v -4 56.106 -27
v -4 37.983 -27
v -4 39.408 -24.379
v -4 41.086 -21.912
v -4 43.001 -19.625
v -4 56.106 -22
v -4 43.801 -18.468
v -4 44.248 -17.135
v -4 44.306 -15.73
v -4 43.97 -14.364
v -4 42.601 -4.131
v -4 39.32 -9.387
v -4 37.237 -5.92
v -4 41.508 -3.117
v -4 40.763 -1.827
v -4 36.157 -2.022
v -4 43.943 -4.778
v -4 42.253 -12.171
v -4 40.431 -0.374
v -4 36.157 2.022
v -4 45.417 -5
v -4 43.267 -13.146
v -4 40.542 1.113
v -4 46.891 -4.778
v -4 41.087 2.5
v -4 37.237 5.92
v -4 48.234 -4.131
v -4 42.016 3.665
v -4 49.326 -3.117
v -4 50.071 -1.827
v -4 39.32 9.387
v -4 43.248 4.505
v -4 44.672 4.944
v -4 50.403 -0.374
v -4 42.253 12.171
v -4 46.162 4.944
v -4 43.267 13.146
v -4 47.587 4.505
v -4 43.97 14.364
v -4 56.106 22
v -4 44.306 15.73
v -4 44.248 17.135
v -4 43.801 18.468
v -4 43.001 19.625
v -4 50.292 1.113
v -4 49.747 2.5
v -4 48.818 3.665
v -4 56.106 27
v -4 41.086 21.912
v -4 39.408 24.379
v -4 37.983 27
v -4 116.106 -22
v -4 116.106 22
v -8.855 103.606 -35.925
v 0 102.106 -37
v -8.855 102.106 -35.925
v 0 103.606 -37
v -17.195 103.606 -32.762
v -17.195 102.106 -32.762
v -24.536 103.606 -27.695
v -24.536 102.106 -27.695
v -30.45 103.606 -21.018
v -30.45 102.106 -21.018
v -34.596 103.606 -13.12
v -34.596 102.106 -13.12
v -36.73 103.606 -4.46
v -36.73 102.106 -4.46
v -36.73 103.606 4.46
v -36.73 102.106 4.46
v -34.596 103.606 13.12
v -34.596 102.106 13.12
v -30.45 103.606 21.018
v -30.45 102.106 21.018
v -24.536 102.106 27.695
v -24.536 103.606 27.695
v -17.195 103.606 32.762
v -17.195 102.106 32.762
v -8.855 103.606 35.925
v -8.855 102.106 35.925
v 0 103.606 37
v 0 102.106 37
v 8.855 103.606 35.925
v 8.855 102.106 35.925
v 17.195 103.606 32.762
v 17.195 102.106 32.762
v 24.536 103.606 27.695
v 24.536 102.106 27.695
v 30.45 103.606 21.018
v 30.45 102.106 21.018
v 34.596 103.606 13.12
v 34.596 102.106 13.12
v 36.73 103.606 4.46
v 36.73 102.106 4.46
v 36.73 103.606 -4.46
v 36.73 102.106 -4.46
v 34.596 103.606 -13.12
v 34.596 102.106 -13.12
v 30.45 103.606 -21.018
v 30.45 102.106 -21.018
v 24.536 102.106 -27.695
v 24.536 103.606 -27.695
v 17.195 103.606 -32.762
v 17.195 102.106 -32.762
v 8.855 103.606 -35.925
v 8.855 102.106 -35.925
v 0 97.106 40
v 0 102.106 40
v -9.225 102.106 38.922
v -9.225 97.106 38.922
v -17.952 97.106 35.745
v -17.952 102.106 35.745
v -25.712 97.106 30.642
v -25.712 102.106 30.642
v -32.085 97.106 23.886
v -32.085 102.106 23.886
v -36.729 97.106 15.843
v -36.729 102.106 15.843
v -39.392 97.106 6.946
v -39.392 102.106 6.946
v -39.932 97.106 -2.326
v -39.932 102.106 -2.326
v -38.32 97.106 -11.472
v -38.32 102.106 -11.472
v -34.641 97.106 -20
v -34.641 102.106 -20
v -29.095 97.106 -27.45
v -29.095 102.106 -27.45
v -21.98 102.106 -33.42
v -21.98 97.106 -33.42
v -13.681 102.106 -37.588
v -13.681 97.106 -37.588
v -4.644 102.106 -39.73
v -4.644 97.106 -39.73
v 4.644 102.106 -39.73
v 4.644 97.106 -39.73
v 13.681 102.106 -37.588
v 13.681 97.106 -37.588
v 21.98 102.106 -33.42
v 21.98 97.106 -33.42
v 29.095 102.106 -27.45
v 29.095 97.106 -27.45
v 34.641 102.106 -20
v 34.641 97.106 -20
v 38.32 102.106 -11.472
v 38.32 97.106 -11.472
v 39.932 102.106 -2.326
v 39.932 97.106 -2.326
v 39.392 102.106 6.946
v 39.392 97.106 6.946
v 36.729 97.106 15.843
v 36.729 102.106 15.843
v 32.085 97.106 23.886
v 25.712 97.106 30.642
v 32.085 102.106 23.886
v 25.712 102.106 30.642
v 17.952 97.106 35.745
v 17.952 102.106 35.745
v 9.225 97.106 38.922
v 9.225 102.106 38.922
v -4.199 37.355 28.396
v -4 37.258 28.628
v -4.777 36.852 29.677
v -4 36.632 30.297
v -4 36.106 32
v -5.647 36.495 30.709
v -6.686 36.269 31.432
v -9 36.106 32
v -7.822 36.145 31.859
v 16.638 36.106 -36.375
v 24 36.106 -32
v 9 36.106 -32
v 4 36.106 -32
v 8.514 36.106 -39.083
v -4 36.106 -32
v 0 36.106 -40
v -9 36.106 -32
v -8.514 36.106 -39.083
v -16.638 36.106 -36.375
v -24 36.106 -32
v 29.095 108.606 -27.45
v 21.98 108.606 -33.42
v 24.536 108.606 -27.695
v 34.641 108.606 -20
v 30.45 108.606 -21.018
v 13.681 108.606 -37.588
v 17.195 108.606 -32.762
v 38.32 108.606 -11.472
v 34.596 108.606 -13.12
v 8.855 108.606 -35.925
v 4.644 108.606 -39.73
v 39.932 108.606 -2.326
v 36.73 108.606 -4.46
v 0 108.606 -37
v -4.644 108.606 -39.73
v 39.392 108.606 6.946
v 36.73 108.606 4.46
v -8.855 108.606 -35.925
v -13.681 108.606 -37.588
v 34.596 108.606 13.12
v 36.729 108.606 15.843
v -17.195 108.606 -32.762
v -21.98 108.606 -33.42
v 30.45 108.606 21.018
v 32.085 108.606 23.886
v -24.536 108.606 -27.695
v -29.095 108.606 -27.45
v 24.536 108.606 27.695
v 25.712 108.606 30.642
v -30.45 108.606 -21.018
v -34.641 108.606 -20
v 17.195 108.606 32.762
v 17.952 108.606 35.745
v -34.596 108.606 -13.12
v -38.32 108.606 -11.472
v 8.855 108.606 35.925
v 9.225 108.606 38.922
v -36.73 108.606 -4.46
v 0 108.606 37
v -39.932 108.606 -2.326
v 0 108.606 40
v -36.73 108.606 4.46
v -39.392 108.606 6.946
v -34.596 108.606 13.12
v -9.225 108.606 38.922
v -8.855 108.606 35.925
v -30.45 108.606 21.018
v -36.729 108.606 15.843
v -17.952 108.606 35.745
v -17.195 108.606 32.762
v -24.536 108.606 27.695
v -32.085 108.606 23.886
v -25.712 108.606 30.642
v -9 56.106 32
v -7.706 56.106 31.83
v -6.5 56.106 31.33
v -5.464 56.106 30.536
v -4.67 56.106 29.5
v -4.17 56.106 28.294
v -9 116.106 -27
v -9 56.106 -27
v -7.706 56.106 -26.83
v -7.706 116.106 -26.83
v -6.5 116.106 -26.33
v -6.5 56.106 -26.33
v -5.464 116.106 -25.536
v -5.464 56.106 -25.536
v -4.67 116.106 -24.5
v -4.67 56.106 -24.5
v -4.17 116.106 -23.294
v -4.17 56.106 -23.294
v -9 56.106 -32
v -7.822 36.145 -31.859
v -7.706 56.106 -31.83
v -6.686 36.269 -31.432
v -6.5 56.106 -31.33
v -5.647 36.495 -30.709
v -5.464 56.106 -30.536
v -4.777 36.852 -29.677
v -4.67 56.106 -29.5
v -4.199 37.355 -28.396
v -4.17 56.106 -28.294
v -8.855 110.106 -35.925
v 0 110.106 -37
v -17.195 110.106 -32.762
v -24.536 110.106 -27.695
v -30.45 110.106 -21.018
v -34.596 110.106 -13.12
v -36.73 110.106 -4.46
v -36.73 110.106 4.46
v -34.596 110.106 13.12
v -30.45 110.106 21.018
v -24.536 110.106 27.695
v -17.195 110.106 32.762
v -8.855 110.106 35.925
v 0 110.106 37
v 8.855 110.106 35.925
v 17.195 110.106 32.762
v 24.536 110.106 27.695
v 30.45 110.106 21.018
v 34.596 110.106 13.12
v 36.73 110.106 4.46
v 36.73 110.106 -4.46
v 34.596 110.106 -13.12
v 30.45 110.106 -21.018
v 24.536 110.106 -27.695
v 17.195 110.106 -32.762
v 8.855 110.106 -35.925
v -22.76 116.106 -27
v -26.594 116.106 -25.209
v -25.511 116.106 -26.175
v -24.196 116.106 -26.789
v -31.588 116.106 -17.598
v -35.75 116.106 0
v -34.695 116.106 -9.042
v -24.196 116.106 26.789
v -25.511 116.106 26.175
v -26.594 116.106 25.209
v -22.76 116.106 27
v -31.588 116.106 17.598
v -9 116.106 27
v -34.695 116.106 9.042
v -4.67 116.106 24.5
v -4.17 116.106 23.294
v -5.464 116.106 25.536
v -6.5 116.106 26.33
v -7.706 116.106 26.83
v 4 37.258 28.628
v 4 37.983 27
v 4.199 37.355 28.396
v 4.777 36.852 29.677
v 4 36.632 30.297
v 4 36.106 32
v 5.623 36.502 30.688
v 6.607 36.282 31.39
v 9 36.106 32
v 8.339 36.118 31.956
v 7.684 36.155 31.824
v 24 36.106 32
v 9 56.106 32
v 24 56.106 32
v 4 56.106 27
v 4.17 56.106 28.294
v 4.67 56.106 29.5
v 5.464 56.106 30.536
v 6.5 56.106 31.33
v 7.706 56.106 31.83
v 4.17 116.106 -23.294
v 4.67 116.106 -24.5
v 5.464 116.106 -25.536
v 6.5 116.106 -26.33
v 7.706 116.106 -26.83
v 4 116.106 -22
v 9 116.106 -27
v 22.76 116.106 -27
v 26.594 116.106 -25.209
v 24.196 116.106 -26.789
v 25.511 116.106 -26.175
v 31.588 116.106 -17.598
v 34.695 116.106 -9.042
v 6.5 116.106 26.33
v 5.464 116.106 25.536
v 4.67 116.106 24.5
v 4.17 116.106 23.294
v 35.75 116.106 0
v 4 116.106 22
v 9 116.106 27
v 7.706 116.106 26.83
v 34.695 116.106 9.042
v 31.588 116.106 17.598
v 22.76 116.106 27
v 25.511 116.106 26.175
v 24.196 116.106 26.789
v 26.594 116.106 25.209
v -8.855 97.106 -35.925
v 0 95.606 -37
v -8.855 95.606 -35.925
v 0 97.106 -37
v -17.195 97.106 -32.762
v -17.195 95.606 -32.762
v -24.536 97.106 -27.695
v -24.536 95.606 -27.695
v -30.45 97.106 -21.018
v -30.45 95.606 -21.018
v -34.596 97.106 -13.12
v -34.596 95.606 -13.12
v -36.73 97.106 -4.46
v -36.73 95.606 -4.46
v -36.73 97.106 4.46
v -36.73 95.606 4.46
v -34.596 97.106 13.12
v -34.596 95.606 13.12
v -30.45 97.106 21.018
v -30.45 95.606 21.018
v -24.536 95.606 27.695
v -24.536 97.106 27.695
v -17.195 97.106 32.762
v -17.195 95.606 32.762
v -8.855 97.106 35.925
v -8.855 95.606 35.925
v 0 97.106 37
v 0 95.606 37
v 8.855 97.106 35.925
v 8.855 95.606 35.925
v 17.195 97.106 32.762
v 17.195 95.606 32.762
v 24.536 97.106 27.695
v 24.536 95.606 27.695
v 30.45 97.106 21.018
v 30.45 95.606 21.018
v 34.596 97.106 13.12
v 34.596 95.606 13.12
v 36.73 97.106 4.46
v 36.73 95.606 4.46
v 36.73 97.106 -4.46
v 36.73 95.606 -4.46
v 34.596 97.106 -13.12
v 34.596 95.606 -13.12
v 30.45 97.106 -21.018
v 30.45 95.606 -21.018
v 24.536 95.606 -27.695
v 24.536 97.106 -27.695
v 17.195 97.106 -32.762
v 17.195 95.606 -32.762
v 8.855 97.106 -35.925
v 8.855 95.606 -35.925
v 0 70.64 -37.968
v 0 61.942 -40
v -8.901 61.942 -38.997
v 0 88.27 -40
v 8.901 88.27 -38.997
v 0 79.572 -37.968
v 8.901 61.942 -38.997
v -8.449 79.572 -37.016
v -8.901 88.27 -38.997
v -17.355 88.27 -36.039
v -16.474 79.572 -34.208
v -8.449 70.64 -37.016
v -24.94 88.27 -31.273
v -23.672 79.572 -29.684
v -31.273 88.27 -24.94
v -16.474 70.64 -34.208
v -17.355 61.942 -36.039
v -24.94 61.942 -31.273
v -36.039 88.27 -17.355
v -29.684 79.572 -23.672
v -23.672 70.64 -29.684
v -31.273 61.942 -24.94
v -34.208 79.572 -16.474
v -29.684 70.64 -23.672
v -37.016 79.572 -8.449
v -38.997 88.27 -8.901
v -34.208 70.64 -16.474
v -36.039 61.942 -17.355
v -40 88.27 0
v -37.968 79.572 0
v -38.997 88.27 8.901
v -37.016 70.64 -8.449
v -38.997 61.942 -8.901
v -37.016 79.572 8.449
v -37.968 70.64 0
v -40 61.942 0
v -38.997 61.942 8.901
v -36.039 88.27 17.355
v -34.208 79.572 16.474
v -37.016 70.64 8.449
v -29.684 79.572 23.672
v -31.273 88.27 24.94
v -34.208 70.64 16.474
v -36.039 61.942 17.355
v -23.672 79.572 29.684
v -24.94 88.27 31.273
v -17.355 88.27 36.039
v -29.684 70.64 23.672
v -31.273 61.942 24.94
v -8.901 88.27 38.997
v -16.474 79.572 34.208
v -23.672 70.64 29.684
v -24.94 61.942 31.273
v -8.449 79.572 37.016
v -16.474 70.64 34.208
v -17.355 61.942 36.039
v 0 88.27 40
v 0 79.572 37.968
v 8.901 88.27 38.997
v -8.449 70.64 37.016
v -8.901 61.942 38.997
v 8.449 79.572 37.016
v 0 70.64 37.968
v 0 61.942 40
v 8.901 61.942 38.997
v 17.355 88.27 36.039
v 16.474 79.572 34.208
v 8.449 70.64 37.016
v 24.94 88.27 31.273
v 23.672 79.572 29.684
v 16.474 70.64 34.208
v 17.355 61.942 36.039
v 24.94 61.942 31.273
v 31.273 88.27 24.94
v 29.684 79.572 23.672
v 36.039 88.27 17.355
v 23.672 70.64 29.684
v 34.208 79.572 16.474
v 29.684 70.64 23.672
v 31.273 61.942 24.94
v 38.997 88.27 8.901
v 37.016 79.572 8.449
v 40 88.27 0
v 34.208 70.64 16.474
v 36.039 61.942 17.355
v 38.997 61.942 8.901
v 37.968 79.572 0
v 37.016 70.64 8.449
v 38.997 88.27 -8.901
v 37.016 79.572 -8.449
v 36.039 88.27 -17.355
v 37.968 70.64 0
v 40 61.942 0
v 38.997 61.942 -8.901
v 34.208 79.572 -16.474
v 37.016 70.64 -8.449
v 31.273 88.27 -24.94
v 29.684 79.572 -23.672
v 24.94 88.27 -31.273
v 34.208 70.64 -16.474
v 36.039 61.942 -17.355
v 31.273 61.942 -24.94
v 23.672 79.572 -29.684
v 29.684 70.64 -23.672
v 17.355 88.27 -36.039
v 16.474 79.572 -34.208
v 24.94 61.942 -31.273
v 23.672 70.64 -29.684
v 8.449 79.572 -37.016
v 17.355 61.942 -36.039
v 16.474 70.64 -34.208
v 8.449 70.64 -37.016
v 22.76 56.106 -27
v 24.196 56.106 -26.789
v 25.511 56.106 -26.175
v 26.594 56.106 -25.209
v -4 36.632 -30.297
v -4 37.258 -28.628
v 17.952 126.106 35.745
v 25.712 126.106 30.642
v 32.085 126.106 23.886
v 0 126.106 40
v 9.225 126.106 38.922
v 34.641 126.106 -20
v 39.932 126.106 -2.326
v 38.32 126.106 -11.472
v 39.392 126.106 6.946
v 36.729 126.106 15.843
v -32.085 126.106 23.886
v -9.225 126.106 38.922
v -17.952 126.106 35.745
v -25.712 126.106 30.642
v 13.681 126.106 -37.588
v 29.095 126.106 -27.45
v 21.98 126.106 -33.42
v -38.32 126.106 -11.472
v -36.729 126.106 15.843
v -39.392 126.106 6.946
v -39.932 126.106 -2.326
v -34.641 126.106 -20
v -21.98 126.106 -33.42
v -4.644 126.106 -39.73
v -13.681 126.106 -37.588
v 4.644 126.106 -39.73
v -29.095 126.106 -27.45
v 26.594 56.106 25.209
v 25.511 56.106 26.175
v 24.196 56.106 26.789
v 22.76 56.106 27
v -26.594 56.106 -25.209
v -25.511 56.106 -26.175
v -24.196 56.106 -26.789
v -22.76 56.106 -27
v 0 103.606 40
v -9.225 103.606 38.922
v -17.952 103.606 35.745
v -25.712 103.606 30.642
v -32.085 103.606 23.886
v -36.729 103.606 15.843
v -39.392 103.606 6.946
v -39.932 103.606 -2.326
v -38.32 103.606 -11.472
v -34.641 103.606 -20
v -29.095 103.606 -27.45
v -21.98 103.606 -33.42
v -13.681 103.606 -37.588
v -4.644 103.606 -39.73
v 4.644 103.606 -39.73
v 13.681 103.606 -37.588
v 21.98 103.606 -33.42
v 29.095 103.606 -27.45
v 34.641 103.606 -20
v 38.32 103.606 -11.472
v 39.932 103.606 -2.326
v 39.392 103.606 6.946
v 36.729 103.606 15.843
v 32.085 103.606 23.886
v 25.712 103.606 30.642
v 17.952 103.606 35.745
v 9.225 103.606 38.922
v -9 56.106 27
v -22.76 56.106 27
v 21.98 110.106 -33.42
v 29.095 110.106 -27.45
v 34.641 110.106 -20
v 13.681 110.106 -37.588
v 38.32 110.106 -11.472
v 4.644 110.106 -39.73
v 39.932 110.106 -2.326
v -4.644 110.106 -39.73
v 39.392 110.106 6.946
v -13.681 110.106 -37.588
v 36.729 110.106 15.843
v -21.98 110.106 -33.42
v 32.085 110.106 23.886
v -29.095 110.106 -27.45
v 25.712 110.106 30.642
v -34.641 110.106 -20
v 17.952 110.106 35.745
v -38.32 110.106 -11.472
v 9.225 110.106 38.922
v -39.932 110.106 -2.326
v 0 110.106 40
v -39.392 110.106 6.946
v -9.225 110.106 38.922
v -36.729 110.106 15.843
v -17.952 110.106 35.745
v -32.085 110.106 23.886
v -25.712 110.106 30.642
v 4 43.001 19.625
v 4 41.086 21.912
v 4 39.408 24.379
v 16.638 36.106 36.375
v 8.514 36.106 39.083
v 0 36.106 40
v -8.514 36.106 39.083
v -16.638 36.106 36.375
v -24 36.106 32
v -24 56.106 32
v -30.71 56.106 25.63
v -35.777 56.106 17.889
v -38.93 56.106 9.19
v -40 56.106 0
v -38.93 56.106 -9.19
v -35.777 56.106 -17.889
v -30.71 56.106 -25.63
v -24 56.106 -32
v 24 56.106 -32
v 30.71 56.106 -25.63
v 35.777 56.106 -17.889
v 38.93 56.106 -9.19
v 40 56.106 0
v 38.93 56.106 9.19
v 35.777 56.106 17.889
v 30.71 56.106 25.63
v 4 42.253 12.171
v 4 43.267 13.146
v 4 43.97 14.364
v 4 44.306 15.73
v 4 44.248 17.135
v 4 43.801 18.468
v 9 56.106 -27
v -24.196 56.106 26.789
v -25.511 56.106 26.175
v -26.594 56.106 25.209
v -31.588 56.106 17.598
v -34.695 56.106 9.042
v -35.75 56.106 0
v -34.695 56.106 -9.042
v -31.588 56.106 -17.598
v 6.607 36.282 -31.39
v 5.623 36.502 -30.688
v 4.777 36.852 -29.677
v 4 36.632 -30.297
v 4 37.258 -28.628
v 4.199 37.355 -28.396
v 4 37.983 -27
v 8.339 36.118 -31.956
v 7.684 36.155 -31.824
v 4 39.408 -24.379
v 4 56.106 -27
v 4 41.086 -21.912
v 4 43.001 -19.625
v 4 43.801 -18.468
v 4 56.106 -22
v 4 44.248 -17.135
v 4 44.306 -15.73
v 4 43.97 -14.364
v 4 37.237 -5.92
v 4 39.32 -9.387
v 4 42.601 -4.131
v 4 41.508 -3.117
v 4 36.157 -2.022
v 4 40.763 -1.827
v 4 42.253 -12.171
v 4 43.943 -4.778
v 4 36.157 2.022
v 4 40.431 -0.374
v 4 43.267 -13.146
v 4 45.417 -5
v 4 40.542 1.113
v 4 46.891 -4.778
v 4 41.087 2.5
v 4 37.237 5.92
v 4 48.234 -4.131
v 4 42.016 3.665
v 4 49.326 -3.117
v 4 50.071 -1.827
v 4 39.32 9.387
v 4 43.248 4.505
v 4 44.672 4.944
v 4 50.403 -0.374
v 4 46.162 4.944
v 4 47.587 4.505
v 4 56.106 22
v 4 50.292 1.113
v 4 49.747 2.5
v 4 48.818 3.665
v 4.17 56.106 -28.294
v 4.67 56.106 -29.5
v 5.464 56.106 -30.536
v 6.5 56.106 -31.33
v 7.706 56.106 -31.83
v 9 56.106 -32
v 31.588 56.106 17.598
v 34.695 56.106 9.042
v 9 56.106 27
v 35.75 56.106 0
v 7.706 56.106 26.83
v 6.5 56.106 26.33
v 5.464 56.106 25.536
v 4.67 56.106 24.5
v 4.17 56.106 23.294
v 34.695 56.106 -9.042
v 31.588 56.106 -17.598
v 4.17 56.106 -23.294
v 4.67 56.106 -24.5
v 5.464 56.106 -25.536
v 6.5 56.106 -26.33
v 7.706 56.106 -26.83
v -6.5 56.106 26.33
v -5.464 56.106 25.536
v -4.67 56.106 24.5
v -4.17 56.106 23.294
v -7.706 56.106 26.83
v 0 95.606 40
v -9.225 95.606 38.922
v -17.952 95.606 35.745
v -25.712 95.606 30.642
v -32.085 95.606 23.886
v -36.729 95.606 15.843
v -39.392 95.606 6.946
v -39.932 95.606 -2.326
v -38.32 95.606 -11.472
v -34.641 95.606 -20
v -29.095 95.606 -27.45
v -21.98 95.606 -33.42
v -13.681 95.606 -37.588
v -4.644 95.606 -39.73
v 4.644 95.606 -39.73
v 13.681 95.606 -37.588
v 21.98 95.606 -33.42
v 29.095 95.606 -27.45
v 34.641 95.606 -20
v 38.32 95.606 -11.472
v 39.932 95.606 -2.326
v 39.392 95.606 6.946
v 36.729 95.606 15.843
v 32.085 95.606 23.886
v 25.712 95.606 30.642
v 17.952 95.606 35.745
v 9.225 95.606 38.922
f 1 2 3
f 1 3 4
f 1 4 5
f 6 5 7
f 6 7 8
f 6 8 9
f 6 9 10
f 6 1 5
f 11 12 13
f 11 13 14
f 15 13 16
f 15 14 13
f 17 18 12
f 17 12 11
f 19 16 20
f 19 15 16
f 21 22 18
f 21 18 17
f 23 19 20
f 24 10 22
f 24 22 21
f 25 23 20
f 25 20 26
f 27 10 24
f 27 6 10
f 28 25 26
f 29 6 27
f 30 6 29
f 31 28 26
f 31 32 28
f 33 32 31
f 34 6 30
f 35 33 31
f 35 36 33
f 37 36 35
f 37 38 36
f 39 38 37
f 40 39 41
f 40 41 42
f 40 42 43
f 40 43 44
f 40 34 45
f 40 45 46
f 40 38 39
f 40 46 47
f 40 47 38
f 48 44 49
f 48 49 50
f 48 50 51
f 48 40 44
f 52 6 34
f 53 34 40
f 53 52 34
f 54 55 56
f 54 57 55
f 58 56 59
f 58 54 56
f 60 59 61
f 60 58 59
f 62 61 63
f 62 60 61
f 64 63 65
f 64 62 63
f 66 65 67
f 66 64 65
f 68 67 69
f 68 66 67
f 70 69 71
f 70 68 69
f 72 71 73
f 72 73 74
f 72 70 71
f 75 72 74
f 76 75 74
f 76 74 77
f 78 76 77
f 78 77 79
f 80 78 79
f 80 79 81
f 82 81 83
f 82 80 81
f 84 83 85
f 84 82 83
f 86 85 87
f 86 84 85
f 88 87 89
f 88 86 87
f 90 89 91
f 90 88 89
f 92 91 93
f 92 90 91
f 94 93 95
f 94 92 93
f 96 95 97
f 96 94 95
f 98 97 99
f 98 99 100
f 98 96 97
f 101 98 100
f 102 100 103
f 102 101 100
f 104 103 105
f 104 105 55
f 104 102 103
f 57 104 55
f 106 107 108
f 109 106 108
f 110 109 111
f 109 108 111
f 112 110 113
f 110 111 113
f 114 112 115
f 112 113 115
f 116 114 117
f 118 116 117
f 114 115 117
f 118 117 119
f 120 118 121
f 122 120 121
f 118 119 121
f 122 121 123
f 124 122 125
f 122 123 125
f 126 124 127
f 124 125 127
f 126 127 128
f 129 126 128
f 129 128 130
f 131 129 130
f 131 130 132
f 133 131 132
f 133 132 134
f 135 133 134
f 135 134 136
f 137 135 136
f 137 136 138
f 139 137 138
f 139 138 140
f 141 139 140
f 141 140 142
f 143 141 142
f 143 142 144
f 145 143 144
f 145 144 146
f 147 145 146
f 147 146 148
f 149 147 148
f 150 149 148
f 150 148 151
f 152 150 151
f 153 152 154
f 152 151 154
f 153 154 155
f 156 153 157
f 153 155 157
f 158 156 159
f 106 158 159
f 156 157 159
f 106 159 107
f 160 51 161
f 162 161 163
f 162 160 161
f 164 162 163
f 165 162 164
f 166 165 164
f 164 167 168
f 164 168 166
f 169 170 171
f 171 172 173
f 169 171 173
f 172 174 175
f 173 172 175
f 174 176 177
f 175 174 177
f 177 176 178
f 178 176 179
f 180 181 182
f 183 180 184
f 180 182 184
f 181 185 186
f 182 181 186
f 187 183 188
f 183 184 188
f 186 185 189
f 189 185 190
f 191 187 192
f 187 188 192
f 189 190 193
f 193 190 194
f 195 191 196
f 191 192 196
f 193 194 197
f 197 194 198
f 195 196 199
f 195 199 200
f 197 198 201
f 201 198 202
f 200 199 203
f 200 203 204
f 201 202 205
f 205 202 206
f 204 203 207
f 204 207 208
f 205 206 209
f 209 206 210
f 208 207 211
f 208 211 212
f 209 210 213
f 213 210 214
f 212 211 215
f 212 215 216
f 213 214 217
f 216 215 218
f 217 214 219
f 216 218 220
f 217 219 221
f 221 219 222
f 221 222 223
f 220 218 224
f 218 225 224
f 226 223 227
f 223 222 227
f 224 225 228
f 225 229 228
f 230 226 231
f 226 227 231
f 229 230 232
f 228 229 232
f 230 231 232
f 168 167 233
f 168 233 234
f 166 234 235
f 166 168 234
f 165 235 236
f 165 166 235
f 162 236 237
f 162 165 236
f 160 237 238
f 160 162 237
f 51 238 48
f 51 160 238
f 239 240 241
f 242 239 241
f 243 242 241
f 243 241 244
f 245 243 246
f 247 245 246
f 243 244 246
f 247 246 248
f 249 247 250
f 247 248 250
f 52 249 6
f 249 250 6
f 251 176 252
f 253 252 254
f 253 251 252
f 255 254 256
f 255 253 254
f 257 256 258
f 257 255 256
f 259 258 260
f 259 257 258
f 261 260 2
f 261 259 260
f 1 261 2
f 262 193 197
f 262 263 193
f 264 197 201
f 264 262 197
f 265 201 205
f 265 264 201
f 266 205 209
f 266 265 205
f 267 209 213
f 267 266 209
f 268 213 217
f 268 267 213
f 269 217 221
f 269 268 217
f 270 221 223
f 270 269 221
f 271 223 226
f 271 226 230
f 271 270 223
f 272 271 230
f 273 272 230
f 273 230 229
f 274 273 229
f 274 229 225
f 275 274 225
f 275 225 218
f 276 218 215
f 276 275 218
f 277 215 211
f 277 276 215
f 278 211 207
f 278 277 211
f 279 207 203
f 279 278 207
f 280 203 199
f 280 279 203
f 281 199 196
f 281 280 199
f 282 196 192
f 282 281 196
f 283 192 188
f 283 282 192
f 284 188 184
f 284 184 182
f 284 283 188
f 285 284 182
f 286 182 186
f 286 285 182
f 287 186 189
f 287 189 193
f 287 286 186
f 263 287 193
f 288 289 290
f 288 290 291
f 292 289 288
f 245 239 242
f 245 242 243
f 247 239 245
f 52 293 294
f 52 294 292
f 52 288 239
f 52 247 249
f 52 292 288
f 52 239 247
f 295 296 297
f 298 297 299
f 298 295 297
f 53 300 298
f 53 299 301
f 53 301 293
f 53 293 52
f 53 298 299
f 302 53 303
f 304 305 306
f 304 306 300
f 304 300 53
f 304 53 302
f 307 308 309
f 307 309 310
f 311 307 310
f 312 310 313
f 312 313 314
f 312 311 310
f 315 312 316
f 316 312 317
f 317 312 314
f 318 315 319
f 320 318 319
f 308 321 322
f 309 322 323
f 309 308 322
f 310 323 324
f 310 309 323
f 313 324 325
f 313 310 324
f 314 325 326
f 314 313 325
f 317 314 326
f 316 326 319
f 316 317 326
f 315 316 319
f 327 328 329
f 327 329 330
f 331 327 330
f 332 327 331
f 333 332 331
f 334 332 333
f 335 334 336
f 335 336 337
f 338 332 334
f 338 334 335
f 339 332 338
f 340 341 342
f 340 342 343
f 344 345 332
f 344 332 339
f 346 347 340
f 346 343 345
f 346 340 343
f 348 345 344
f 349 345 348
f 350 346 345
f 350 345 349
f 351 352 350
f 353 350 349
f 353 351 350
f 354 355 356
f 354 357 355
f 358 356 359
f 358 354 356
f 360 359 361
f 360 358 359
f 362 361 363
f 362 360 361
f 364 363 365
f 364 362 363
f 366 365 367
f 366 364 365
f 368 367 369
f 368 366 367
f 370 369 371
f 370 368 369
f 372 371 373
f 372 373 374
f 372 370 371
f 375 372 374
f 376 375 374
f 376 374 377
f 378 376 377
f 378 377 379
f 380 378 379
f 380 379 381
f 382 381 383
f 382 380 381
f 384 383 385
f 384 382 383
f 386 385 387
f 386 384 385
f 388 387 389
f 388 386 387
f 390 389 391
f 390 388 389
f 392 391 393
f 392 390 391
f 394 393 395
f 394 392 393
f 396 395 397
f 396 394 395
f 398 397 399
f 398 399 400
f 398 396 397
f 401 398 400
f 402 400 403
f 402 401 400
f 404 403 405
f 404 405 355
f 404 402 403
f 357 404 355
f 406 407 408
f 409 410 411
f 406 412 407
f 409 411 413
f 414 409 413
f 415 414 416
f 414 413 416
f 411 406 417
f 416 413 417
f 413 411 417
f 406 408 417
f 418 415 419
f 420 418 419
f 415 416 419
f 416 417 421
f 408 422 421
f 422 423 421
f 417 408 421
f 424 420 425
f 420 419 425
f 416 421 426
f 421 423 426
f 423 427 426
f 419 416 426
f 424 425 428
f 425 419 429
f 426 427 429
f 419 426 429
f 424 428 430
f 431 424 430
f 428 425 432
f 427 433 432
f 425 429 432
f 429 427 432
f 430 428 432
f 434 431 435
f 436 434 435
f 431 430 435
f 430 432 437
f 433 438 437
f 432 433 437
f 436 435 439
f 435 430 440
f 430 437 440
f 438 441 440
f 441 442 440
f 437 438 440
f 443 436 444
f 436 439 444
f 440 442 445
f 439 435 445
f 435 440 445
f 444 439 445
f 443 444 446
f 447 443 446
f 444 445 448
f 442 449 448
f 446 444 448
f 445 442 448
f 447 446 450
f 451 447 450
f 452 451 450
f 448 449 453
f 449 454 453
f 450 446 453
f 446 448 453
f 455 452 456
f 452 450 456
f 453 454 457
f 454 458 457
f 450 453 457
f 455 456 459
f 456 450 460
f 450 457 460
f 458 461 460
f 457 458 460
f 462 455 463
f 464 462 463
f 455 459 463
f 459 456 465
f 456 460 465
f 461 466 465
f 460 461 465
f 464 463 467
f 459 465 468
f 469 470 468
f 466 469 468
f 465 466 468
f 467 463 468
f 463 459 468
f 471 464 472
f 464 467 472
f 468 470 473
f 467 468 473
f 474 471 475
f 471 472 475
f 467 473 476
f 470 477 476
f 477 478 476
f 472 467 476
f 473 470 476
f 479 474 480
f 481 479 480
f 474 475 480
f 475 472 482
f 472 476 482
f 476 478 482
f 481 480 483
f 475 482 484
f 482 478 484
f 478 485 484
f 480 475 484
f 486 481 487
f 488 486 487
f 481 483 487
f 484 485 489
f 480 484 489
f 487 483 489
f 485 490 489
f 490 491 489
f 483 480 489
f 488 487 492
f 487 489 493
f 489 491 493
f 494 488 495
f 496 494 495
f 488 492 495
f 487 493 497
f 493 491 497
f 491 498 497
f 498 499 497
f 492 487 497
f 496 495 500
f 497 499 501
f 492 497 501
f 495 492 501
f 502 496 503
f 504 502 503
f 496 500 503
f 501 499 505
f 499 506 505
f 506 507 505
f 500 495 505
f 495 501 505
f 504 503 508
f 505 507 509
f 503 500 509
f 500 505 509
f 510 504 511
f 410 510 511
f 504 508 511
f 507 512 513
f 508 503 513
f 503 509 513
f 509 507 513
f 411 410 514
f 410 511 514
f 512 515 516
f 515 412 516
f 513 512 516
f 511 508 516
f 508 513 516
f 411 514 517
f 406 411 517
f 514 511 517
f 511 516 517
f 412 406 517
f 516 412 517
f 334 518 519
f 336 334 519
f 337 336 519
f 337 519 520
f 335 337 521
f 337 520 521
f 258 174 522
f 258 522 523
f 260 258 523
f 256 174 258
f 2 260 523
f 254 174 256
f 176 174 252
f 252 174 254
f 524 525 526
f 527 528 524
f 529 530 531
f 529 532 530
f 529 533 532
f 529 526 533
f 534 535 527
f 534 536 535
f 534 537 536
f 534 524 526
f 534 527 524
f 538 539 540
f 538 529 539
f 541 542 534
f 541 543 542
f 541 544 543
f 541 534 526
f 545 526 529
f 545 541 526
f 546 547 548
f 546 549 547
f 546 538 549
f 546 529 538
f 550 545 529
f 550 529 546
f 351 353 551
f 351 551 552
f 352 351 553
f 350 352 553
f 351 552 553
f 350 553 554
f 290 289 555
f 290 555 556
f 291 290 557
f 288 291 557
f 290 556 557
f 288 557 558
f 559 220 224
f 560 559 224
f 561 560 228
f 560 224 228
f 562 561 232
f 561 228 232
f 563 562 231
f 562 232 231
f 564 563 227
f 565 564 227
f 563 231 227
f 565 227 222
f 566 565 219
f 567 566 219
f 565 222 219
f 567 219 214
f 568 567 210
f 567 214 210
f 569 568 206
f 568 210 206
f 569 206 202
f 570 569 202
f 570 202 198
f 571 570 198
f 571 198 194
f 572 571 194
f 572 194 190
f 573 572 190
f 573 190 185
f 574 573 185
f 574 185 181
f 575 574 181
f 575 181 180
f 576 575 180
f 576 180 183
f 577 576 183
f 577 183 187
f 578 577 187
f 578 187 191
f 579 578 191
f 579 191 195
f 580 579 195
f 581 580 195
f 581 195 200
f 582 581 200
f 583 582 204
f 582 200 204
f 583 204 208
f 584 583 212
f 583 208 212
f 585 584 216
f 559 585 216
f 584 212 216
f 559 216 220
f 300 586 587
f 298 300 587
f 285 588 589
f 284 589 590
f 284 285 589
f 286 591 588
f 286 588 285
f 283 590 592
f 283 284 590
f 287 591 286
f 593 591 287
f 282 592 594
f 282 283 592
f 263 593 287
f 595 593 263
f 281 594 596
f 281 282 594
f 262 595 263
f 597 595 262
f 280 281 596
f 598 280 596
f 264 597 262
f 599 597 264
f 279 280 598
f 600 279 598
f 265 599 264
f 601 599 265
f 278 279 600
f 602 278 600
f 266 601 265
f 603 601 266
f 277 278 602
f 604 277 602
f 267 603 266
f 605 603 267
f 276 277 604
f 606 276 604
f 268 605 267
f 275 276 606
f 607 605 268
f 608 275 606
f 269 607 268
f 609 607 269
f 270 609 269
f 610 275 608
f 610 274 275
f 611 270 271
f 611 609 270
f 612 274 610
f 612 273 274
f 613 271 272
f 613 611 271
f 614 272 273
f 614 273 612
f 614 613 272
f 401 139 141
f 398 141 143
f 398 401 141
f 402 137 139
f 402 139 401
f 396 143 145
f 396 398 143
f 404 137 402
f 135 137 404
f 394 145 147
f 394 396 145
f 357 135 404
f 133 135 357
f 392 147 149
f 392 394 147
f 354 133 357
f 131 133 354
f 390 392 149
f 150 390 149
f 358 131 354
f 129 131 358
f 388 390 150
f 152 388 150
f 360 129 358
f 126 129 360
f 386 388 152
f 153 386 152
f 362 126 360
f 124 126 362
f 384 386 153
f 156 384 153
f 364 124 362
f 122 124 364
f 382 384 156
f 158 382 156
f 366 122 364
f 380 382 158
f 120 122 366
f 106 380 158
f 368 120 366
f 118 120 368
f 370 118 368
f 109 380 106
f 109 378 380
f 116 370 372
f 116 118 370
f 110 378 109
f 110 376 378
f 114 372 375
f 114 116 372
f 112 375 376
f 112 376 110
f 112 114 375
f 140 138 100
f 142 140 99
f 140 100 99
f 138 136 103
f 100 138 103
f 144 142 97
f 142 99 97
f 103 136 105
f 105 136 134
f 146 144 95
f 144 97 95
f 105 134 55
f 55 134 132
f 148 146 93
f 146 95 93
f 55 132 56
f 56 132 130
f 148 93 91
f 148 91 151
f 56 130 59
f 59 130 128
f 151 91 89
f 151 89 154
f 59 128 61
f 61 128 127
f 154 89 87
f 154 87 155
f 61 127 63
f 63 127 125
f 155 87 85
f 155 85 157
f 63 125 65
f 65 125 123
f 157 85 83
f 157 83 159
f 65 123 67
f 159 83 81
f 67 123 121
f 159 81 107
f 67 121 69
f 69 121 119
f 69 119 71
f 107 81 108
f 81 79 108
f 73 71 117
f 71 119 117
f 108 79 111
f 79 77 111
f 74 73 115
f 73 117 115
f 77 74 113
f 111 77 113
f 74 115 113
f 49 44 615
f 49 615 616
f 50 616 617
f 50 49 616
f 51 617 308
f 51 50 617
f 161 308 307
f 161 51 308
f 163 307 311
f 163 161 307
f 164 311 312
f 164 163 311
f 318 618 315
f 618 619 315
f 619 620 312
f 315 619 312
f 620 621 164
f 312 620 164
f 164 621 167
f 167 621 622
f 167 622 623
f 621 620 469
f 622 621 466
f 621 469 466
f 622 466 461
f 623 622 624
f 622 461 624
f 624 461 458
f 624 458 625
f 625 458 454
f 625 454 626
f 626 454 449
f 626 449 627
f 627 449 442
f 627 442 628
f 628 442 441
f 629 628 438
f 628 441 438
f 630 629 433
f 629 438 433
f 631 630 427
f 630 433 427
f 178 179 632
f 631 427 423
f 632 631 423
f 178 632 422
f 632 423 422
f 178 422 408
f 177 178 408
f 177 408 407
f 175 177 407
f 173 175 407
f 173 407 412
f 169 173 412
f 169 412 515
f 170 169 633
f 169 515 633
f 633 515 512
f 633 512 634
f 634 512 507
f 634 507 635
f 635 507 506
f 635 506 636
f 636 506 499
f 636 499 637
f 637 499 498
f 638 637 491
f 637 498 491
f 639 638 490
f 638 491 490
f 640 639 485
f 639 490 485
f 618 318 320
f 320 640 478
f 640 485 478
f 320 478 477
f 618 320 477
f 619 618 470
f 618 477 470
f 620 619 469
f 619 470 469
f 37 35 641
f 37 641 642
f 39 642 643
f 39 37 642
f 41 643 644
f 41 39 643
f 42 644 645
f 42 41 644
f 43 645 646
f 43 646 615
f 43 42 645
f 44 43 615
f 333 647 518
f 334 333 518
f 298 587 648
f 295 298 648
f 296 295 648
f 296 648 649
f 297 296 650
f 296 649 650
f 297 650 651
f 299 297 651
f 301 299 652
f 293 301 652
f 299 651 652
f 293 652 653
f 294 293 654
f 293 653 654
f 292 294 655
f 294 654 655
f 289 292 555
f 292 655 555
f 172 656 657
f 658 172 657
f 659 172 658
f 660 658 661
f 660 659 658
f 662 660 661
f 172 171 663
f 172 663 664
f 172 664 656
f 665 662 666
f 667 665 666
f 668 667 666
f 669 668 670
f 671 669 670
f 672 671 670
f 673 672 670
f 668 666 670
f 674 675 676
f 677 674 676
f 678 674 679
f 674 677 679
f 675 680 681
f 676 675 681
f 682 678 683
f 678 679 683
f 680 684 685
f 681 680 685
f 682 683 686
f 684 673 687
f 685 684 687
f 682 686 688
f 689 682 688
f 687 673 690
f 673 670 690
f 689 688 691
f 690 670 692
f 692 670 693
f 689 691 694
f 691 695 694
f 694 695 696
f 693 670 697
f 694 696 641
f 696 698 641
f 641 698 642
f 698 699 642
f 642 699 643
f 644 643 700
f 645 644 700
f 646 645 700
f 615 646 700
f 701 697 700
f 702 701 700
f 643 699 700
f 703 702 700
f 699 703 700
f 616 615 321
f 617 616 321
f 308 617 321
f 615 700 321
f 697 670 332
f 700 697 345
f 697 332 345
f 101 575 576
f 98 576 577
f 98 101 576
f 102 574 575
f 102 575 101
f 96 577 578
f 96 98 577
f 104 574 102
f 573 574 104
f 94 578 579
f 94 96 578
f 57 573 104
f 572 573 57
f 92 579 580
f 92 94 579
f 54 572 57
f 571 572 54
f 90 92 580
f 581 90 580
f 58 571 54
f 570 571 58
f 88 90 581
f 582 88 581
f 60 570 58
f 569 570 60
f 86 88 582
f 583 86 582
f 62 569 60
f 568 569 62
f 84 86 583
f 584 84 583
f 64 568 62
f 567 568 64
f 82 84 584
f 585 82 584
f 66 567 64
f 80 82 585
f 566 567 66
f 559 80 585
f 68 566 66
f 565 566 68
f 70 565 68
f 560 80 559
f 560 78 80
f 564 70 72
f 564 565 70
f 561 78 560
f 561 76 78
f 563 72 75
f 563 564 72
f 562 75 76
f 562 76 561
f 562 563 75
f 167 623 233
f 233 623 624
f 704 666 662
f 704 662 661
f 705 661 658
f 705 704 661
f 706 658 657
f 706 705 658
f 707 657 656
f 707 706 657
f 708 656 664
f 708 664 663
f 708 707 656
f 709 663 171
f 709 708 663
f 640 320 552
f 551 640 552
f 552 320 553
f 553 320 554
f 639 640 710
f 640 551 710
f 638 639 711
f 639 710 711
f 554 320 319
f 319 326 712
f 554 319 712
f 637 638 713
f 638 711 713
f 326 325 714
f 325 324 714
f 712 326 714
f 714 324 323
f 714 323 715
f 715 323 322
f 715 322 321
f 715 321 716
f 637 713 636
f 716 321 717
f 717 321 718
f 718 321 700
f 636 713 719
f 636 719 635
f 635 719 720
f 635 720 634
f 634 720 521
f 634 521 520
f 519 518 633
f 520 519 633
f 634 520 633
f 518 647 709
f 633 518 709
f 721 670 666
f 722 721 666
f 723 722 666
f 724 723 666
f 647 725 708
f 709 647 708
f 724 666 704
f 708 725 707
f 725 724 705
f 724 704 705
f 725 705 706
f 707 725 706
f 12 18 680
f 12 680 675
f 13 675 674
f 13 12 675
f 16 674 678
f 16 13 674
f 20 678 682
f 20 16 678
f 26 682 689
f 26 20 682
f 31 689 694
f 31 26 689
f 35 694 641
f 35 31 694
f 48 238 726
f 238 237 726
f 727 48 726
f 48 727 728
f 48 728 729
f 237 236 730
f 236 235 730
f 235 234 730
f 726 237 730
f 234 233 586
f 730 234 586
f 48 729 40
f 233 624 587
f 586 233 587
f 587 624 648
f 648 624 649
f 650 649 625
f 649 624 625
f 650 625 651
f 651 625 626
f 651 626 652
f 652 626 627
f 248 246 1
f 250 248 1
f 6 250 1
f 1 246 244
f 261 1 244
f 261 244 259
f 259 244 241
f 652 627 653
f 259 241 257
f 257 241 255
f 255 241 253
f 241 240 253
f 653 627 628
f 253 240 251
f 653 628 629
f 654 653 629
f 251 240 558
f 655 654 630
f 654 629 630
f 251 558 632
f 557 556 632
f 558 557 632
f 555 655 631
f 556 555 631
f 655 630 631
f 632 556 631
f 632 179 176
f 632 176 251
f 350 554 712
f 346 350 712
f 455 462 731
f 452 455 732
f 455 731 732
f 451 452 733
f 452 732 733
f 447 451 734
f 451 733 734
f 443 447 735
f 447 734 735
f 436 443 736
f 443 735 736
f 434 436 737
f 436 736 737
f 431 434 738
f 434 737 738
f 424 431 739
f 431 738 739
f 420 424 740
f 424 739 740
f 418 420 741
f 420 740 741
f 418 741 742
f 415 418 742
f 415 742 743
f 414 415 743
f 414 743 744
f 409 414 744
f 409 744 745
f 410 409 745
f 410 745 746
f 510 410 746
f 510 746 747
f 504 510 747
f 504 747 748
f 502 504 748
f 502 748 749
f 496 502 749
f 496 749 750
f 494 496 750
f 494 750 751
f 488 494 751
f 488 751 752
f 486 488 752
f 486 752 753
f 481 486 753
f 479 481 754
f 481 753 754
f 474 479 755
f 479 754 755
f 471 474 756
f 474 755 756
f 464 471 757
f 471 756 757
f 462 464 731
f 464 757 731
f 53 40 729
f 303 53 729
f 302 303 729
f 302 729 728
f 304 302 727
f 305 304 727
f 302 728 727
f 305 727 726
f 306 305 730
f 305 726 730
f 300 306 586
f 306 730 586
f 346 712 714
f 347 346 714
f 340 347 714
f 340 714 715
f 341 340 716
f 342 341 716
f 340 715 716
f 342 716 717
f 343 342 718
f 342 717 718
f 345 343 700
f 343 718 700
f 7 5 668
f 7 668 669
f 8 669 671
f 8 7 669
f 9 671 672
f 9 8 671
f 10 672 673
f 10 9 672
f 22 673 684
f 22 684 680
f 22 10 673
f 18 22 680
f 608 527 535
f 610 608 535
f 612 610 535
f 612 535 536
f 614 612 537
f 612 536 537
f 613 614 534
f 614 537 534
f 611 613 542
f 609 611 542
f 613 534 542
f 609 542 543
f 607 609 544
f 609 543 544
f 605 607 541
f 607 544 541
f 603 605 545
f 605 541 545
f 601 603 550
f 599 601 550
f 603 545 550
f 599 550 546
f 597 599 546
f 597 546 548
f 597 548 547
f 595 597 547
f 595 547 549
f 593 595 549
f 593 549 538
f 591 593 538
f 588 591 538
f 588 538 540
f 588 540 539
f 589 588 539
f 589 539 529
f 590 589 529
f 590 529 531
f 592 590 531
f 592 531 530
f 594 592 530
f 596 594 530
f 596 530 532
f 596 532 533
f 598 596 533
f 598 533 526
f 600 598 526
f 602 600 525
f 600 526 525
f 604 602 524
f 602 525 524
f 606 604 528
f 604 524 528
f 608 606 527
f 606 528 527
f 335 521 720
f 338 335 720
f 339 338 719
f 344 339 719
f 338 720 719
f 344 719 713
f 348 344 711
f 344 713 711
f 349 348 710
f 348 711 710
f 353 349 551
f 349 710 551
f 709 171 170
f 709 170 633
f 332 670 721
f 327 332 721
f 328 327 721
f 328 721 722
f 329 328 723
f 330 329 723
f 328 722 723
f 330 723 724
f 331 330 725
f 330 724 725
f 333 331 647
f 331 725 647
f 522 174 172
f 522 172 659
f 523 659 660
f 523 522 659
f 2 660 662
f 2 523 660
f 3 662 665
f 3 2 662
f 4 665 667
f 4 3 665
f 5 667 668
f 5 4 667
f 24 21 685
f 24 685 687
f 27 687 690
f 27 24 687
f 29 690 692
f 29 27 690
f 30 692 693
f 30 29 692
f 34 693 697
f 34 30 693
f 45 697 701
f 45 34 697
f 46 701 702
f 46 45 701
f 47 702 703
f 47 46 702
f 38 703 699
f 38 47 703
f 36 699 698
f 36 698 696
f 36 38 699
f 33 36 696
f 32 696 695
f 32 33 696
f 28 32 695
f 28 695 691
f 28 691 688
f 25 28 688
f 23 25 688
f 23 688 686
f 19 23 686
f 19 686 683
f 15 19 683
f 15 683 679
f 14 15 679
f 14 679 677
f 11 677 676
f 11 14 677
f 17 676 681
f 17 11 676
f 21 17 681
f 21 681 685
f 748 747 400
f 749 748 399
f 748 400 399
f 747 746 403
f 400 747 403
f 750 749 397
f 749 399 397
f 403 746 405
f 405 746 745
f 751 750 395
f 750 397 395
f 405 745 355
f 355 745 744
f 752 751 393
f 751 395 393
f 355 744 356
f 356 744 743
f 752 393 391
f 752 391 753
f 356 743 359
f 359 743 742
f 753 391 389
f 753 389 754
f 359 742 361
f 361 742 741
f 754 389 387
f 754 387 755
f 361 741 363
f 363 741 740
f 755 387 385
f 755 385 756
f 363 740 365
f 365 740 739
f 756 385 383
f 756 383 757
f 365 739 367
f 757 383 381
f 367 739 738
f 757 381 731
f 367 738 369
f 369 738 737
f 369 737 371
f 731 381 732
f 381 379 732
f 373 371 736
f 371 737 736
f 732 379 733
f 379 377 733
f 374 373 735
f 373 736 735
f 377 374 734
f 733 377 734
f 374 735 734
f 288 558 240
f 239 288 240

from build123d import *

# Parameters (mm, degrees)
SKETCH2_W                = 40
SKETCH2_H                = 70
SKETCH4_W                = 40
SKETCH4_H                = 20
CUT_EXTRUDE1_DEPTH       = 51
CUT_EXTRUDE1_DEPTH_BACK  = 47
SKETCH5_W                = 64
SKETCH5_H                = 20
BOSS_EXTRUDE1_DEPTH      = 4
BOSS_EXTRUDE1_DEPTH_BACK = 4
SKETCH3_R                = 5
FILLET2_R                = 5
FILLET3_R                = 5
CUT_EXTRUDE2_DEPTH       = 60
SKETCH8_W                = 3
SKETCH8_H                = 1.5


with BuildPart() as part:
    # Sketch2 → Revolve1 (revolve)
    with BuildSketch(Plane(origin=(0, 0, 0), x_dir=(0, 0, -1), z_dir=(1, 0, 0)), mode=Mode.PRIVATE) as revolve1_sk:
        with Locations((20, 91.106067618)):
            Rectangle(SKETCH2_W, SKETCH2_H)
    revolve(revolve1_sk.sketch.rotate(Axis((0, 126.106067618, 0), (0, -1, 0)), 180), axis=Axis((0, 126.106067618, 0), (0, -1, 0)))

    # Sketch4 → Revolve2 (revolve)
    with BuildSketch(Plane(origin=(0, 0, 0), x_dir=(0, 0, -1), z_dir=(1, 0, 0)), mode=Mode.PRIVATE) as revolve2_sk:
        with Locations((20, 46.106067618)):
            Rectangle(SKETCH4_W, SKETCH4_H)
    revolve(revolve2_sk.sketch.rotate(Axis((0, 56.106067618, 0), (0, -1, 0)), 180), axis=Axis((0, 56.106067618, 0), (0, -1, 0)))

    # Sketch5 → Cut-Extrude1 (cut, two sides: drawn at the far end of the back side and taken through both)
    with BuildSketch(Plane(origin=(0, 0, 0), x_dir=(0, 0, -1), z_dir=(1, 0, 0)).offset(-CUT_EXTRUDE1_DEPTH_BACK)):
        with Locations((0, 46.106067618)):
            Rectangle(SKETCH5_W, SKETCH5_H)
    extrude(amount=CUT_EXTRUDE1_DEPTH + CUT_EXTRUDE1_DEPTH_BACK, mode=Mode.SUBTRACT)

    # Sketch3 → Boss-Extrude1 (add, two sides: drawn at the far end of the back side and taken through both)
    with BuildSketch(Plane(origin=(0, 0, 0), x_dir=(0, 0, -1), z_dir=(1, 0, 0)).offset(-BOSS_EXTRUDE1_DEPTH_BACK)):
        with BuildLine():
            Line((-32, 56.106067618), (-14.456832295, 56.106067618))
            Line((-14.456832295, 56.106067618), (14.456832295, 56.106067618))
            Line((14.456832295, 56.106067618), (32, 56.106067618))
            Line((32, 56.106067618), (32, 36.106067618))
            ThreePointArc((32, 36.106067618), (25.399471898, 38.812393939), (19.624541582, 43.00063381))
            ThreePointArc((19.624541582, 43.00063381), (15.729589271, 44.305817394), (12.171473884, 42.25302111))
            ThreePointArc((12.171473884, 42.25302111), (0, 36.019732208), (-12.171473884, 42.25302111))
            ThreePointArc((-12.171473884, 42.25302111), (-15.729589271, 44.305817394), (-19.624541582, 43.00063381))
            ThreePointArc((-19.624541582, 43.00063381), (-25.399471898, 38.812393939), (-32, 36.106067618))
            Line((-32, 36.106067618), (-32, 56.106067618))
        make_face()
        with Locations((0, 45.417119487)):
            Circle(SKETCH3_R, mode=Mode.SUBTRACT)
    extrude(amount=BOSS_EXTRUDE1_DEPTH + BOSS_EXTRUDE1_DEPTH_BACK)

    # Fillet2
    # the kernel refuses this fillet: 5 mm, written as the material it adds along each edge
    with BuildSketch(Plane(origin=(4, 36.106067618, 32), x_dir=(1, 0, 0), z_dir=(0, 1, 0))) as fillet2_piece_1_section:
        with BuildLine():
            CenterArc((FILLET2_R, FILLET2_R), FILLET2_R, 180, 90)
            Line((0, FILLET2_R), (0, 0))
            Line((0, 0), (FILLET2_R, 0))
        make_face()
    fillet2_piece_1 = extrude(amount=32.5, mode=Mode.PRIVATE)
    fillet2_piece_1 = fillet2_piece_1 & Plane(origin=(5.143552766, 65.019732208, 40), x_dir=(0, -0.7339699466021848, -0.6791819472606629), z_dir=(-1, 0, 0)) * Cylinder(30, 85, mode=Mode.PRIVATE)
    add(fillet2_piece_1)

    # Fillet3
    # the kernel refuses this fillet: 5 mm, written as the material it adds along each edge
    with BuildSketch(Plane(origin=(-4, 36.106067618, 32), x_dir=(0, 0, -1), z_dir=(0, 1, 0))) as fillet3_piece_1_section:
        with BuildLine():
            CenterArc((FILLET3_R, FILLET3_R), FILLET3_R, 180, 90)
            Line((0, FILLET3_R), (0, 0))
            Line((0, 0), (FILLET3_R, 0))
        make_face()
    fillet3_piece_1 = extrude(amount=32.5, mode=Mode.PRIVATE)
    fillet3_piece_1 = fillet3_piece_1 & Plane(origin=(-5.143552934, 65.019732208, 40), x_dir=(0, -0.7339699466019316, -0.6791819472609367), z_dir=(-1, 0, 0)) * Cylinder(30, 85, mode=Mode.PRIVATE)
    add(fillet3_piece_1)
    with BuildSketch(Plane(origin=(-4, 68.606067618, -32), x_dir=(0, 0, 1), z_dir=(0, -1, 0))) as fillet3_piece_2_section:
        with BuildLine():
            CenterArc((FILLET3_R, FILLET3_R), FILLET3_R, 180, 90)
            Line((0, FILLET3_R), (0, 0))
            Line((0, 0), (FILLET3_R, 0))
        make_face()
    fillet3_piece_2 = extrude(amount=32.5, mode=Mode.PRIVATE)
    fillet3_piece_2 = fillet3_piece_2 & Plane(origin=(-5.131975571, 65.019732208, -40), x_dir=(0, -0.9637888196533986, 0.26666666666666256), z_dir=(-1, 0, 0)) * Cylinder(30, 85, mode=Mode.PRIVATE)
    add(fillet3_piece_2)
    with BuildSketch(Plane(origin=(4, 68.606067618, -32), x_dir=(0, 0, 1), z_dir=(0, -1, 0))) as fillet3_piece_3_section:
        with BuildLine():
            CenterArc((FILLET3_R, -FILLET3_R), FILLET3_R, 90, 90)
            Line((0, -FILLET3_R), (0, 0))
            Line((0, 0), (FILLET3_R, 0))
        make_face()
    fillet3_piece_3 = extrude(amount=32.5, mode=Mode.PRIVATE)
    fillet3_piece_3 = fillet3_piece_3 & Plane(origin=(5.131975571, 65.019732208, -40), x_dir=(0, -0.9637888196533986, 0.26666666666666256), z_dir=(-1, 0, 0)) * Cylinder(30, 85, mode=Mode.PRIVATE)
    add(fillet3_piece_3)

    # Sketch7 → Cut-Extrude2 (cut)
    with BuildSketch(Plane.XZ.offset(-56.106067618)):
        with BuildLine():
            Line((-4, -22), (-4, 22))
            ThreePointArc((-4, 22), (-5.464466094, 25.535533906), (-9, 27))
            Line((-9, 27), (-22.759731635, 27))
            ThreePointArc((-22.759731635, 27), (-24.875929217, 26.530089159), (-26.594357126, 25.208683117))
            ThreePointArc((-26.594357126, 25.208683117), (-35.75, 0), (-26.594357126, -25.208683117))
            ThreePointArc((-26.594357126, -25.208683117), (-24.875929217, -26.530089159), (-22.759731635, -27))
            Line((-22.759731635, -27), (-9, -27))
            ThreePointArc((-9, -27), (-5.464466094, -25.535533906), (-4, -22))
        make_face()
        with BuildLine():
            Line((9, -27), (22.759731635, -27))
            ThreePointArc((22.759731635, -27), (24.875929217, -26.530089159), (26.594357126, -25.208683117))
            ThreePointArc((26.594357126, -25.208683117), (35.75, 0), (26.594357126, 25.208683117))
            ThreePointArc((26.594357126, 25.208683117), (24.875929217, 26.530089159), (22.759731635, 27))
            Line((22.759731635, 27), (9, 27))
            ThreePointArc((9, 27), (5.464466094, 25.535533906), (4, 22))
            Line((4, 22), (4, -22))
            ThreePointArc((4, -22), (5.464466094, -25.535533906), (9, -27))
        make_face()
    extrude(amount=-CUT_EXTRUDE2_DEPTH, mode=Mode.SUBTRACT)

    # Sketch8 → Cut-Revolve1 (revolve, cut)
    with BuildSketch(Plane(origin=(0, 0, 0), x_dir=(0, 0, -1), z_dir=(1, 0, 0))):
        with Locations((38.5, 109.356067618)):
            Rectangle(SKETCH8_W, SKETCH8_H)
        with Locations((38.5, 102.856067618)):
            Rectangle(SKETCH8_W, SKETCH8_H)
        with BuildLine():
            Line((40, 61.941769102), (40, 88.270366135))
            ThreePointArc((40, 88.270366135), (37.711050715, 75.106067618), (40, 61.941769102))
        make_face()
        with Locations((38.5, 96.356067618)):
            Rectangle(SKETCH8_W, SKETCH8_H)
    revolve(axis=Axis((0, 45.417119487, 0), (0, 1, 0)), mode=Mode.SUBTRACT)


solid = part.part
